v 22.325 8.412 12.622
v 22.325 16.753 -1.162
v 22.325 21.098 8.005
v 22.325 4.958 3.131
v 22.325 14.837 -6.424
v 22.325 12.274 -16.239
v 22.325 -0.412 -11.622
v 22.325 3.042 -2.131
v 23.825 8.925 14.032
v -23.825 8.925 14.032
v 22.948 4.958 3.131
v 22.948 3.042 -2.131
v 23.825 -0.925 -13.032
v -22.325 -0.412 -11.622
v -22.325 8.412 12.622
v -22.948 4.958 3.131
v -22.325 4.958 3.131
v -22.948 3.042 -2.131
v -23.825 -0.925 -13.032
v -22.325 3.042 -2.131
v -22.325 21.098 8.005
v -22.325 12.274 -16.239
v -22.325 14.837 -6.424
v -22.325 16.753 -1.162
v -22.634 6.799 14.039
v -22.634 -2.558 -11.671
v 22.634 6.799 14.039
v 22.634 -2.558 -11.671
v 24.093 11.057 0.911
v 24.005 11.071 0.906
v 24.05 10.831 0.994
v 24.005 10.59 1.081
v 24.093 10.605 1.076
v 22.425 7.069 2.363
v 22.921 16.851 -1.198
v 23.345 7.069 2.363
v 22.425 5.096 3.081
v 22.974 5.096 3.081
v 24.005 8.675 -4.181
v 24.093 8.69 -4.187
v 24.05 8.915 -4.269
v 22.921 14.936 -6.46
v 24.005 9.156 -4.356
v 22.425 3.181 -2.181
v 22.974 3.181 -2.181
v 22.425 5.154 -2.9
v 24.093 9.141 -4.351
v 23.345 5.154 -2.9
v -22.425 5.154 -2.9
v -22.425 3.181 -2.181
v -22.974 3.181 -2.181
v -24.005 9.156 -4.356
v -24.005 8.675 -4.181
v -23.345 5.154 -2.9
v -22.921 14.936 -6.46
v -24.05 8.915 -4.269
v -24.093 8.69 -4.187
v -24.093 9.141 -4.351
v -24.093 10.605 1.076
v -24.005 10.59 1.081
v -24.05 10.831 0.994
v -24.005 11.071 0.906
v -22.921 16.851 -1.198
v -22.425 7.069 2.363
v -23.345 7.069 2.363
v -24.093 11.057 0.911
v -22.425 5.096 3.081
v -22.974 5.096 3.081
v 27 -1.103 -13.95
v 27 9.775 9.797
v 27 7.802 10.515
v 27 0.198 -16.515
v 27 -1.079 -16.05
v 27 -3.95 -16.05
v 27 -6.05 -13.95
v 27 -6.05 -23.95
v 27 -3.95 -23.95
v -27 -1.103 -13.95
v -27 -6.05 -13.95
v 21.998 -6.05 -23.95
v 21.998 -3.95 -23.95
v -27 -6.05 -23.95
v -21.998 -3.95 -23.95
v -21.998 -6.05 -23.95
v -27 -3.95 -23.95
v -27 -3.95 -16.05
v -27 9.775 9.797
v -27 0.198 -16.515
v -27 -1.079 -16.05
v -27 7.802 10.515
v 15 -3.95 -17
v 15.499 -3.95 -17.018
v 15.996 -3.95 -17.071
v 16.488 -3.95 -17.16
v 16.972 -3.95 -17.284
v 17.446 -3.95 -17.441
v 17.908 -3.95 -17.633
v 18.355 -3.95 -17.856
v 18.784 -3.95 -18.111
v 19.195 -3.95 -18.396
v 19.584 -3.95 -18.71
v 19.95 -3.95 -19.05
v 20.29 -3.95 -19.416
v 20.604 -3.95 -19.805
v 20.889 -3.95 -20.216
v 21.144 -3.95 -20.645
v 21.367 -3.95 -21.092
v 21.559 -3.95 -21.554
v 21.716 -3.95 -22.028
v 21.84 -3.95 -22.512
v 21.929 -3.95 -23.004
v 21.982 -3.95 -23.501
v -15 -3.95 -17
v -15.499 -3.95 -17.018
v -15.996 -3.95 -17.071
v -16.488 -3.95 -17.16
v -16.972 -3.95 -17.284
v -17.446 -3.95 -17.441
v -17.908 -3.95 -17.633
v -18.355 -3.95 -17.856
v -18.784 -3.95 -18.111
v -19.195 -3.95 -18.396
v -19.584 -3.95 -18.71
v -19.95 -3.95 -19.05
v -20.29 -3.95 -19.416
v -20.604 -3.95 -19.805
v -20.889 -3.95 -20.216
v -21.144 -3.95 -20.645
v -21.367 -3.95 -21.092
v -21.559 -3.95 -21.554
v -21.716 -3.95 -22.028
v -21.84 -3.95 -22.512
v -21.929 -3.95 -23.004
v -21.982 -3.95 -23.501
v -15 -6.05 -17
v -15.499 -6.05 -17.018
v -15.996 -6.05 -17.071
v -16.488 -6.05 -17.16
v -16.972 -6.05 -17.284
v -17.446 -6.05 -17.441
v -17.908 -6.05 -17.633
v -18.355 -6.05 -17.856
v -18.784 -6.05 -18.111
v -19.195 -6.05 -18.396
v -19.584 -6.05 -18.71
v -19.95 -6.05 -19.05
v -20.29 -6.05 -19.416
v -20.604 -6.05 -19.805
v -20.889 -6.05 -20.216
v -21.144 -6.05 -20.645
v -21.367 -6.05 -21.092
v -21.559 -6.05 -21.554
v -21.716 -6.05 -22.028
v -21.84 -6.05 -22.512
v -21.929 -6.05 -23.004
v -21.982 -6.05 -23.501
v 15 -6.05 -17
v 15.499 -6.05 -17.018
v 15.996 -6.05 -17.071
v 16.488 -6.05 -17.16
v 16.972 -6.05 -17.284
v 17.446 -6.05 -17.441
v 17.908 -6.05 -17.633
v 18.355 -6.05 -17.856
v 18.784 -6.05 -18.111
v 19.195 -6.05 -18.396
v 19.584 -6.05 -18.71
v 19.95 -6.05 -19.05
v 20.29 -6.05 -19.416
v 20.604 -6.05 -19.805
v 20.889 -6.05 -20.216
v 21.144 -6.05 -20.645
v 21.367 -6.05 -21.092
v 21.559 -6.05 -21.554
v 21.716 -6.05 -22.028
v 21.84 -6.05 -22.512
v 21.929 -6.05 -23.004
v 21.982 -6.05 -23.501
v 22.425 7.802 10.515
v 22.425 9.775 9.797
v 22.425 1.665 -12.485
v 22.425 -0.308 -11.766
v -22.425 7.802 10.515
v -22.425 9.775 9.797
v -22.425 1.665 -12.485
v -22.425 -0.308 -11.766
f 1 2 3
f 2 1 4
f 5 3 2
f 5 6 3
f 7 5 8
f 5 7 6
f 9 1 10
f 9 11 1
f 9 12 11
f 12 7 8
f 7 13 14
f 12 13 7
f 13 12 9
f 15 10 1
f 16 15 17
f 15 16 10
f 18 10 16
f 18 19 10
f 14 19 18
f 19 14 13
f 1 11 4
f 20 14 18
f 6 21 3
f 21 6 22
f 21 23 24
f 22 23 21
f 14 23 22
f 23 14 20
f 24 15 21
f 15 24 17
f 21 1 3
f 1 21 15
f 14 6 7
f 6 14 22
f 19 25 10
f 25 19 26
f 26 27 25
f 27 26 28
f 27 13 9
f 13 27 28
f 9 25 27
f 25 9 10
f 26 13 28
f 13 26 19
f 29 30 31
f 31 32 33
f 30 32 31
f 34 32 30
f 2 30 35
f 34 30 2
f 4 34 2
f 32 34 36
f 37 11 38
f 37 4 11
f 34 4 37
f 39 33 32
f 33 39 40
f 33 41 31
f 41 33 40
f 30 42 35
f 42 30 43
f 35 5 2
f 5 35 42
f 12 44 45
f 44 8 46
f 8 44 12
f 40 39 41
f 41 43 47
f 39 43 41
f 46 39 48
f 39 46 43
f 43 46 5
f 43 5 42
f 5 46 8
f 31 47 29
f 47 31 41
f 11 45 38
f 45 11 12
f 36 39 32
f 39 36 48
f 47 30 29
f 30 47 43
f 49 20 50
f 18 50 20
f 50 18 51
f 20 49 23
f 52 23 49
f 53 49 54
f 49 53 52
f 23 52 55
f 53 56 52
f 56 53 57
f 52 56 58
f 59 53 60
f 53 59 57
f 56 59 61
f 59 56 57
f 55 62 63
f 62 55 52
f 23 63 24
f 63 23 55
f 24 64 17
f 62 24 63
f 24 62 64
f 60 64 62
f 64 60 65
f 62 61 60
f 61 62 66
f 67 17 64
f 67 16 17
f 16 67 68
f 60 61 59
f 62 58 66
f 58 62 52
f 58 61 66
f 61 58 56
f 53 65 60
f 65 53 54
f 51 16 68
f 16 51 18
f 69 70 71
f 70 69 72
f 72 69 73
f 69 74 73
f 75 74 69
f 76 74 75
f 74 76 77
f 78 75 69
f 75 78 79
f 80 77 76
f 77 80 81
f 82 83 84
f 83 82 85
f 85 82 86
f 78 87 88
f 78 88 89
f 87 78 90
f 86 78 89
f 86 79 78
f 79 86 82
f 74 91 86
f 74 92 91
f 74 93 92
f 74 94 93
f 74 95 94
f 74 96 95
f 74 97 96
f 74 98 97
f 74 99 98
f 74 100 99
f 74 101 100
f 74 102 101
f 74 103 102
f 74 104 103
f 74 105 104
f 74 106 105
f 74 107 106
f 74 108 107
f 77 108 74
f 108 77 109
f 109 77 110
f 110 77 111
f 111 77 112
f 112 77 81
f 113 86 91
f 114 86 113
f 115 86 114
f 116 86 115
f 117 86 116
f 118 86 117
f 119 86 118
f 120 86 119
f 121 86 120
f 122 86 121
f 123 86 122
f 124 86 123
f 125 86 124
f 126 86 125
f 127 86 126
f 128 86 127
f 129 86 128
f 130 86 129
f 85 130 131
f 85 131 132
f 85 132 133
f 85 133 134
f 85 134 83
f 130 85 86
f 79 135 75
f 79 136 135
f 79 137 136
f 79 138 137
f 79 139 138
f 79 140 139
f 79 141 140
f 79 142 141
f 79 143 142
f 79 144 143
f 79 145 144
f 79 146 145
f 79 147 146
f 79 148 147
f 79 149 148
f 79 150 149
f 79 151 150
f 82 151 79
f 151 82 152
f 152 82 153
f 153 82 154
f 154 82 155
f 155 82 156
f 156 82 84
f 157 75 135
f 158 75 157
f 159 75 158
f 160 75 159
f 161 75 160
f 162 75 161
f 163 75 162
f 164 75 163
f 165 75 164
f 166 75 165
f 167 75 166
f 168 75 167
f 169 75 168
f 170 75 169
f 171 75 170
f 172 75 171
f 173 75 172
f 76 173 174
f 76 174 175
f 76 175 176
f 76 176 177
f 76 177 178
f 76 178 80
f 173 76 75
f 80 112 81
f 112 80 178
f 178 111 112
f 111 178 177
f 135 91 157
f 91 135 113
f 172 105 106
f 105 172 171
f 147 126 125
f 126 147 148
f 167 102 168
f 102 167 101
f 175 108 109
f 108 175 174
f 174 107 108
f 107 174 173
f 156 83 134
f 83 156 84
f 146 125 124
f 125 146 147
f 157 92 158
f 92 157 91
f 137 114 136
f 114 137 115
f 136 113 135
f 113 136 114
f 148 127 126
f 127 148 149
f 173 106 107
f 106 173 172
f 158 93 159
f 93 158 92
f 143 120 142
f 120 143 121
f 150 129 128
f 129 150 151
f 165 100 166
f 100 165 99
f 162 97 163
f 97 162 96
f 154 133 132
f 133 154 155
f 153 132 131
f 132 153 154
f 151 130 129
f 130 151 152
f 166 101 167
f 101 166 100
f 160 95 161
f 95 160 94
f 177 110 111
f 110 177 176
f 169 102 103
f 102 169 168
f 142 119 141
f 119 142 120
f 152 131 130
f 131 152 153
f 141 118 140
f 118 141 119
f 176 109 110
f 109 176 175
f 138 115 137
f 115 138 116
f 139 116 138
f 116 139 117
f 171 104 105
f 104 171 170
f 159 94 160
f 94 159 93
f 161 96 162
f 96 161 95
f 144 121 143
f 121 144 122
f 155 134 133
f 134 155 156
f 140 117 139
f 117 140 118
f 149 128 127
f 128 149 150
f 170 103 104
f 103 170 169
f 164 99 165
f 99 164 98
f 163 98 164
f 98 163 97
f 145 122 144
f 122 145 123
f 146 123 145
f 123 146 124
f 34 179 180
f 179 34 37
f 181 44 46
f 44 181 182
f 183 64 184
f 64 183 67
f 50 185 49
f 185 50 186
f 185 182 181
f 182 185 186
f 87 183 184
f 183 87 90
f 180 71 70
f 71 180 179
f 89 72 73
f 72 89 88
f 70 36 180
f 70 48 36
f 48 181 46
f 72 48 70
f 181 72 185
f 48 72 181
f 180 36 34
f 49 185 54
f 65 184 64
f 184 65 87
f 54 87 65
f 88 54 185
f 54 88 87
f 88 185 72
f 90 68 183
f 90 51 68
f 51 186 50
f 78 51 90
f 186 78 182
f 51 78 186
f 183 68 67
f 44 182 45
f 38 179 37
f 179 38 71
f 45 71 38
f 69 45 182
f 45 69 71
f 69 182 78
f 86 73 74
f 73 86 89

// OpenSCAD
// file: rounder.scad
// rounder.scad
// cutting tool for rounding off corners with a cylinder

//---------------------
module rounder(
r=10,   // radius
h=10,   // height
f=22,    // $fn
extra=0.01  // extra size for the cube
){

difference(){
  translate([-extra,-extra,-extra])
  cube([r+extra,r+extra,h+2*extra]);
  translate([r,r,-1])
  cylinder(r=r,h=h+2,$fn=f);
}

}

//---------------------------------------------------------------------------
module bevel(x=1,y=1,h=10){

linear_extrude(height=h)
polygon(points=[[0,0],[x,0],[0,y]]);
    
}
  

//========================

rounder();

//========================
// main file
//=================================================================================
// humid.scad
//
// humidity and temp sensor box and mounts
//
// Dr Tom Flint, 27 Jan 2023
//
//=================================================================================

use <../Parts/rounder.scad>

//---------------------------------------------------------------------------------
module sensor(tol=0){

rotate([90,0,0]){
  
  // base box
  translate([0,0,-13.5/2])
  cube([44.65+tol,25.8+tol,13.5+tol],center=true);
  
  // bezel
  linear_extrude(height=2,scale=0.95)
  square([44.65+3+tol,25.8+3+tol],center=true);

  // tabs
  color("cyan")
  translate([44.65/2+0,0,-0.75*13.5+1])
  rotate([0,10,0])
  cube([2.4,5.6,13.5/2],center=true);
  
  // tabs
  color("cyan")
  translate([44.65/2+0,0,-0.25*13.5])
  rotate([0,-10,0])
  cube([2.4,5.6,13.5/2],center=true);

  // tabs
  color("green")
  translate([-44.65/2+0,0,-0.75*13.5+1])
  rotate([0,-10,0])
  cube([2.4,5.6,13.5/2],center=true);
  
  // tabs
  color("green")
  translate([-44.65/2+0,0,-0.25*13.5])
  rotate([0,10,0])
  cube([2.4,5.6,13.5/2],center=true);

}
}


//---------------------------------------------------------------------------------
module shelf(){

wide=54;

  // base box
  translate([0,-2.5,-15])
  cube([wide,5.5,2.1],center=true);

  // foot below
  difference(){
    translate([0,-5,-19+0.05])
    cube([wide,2.1,10],center=true);
    hull(){
      translate([-15,-5,-24])
      rotate([90,0,0])
      cylinder(r=7,h=10,center=true,$fn=88);
      translate([15,-5,-24])
      rotate([90,0,0])
      cylinder(r=7,h=10,center=true,$fn=88);
    }
  }

  // collar around sensor
  difference(){
    translate([0,4,-3])
    rotate([-20,0,0])
    cube([wide,2.1,28],center=true);

  translate([0,4,0.5])
  rotate([-20,0,0])
  sensor(tol=0.2);
}


}

//=================================================================================

if(1){
  color("cyan")
  translate([0,4,0.5])
  rotate([-20,0,0])
  sensor();
}

shelf();


//=================================================================================
